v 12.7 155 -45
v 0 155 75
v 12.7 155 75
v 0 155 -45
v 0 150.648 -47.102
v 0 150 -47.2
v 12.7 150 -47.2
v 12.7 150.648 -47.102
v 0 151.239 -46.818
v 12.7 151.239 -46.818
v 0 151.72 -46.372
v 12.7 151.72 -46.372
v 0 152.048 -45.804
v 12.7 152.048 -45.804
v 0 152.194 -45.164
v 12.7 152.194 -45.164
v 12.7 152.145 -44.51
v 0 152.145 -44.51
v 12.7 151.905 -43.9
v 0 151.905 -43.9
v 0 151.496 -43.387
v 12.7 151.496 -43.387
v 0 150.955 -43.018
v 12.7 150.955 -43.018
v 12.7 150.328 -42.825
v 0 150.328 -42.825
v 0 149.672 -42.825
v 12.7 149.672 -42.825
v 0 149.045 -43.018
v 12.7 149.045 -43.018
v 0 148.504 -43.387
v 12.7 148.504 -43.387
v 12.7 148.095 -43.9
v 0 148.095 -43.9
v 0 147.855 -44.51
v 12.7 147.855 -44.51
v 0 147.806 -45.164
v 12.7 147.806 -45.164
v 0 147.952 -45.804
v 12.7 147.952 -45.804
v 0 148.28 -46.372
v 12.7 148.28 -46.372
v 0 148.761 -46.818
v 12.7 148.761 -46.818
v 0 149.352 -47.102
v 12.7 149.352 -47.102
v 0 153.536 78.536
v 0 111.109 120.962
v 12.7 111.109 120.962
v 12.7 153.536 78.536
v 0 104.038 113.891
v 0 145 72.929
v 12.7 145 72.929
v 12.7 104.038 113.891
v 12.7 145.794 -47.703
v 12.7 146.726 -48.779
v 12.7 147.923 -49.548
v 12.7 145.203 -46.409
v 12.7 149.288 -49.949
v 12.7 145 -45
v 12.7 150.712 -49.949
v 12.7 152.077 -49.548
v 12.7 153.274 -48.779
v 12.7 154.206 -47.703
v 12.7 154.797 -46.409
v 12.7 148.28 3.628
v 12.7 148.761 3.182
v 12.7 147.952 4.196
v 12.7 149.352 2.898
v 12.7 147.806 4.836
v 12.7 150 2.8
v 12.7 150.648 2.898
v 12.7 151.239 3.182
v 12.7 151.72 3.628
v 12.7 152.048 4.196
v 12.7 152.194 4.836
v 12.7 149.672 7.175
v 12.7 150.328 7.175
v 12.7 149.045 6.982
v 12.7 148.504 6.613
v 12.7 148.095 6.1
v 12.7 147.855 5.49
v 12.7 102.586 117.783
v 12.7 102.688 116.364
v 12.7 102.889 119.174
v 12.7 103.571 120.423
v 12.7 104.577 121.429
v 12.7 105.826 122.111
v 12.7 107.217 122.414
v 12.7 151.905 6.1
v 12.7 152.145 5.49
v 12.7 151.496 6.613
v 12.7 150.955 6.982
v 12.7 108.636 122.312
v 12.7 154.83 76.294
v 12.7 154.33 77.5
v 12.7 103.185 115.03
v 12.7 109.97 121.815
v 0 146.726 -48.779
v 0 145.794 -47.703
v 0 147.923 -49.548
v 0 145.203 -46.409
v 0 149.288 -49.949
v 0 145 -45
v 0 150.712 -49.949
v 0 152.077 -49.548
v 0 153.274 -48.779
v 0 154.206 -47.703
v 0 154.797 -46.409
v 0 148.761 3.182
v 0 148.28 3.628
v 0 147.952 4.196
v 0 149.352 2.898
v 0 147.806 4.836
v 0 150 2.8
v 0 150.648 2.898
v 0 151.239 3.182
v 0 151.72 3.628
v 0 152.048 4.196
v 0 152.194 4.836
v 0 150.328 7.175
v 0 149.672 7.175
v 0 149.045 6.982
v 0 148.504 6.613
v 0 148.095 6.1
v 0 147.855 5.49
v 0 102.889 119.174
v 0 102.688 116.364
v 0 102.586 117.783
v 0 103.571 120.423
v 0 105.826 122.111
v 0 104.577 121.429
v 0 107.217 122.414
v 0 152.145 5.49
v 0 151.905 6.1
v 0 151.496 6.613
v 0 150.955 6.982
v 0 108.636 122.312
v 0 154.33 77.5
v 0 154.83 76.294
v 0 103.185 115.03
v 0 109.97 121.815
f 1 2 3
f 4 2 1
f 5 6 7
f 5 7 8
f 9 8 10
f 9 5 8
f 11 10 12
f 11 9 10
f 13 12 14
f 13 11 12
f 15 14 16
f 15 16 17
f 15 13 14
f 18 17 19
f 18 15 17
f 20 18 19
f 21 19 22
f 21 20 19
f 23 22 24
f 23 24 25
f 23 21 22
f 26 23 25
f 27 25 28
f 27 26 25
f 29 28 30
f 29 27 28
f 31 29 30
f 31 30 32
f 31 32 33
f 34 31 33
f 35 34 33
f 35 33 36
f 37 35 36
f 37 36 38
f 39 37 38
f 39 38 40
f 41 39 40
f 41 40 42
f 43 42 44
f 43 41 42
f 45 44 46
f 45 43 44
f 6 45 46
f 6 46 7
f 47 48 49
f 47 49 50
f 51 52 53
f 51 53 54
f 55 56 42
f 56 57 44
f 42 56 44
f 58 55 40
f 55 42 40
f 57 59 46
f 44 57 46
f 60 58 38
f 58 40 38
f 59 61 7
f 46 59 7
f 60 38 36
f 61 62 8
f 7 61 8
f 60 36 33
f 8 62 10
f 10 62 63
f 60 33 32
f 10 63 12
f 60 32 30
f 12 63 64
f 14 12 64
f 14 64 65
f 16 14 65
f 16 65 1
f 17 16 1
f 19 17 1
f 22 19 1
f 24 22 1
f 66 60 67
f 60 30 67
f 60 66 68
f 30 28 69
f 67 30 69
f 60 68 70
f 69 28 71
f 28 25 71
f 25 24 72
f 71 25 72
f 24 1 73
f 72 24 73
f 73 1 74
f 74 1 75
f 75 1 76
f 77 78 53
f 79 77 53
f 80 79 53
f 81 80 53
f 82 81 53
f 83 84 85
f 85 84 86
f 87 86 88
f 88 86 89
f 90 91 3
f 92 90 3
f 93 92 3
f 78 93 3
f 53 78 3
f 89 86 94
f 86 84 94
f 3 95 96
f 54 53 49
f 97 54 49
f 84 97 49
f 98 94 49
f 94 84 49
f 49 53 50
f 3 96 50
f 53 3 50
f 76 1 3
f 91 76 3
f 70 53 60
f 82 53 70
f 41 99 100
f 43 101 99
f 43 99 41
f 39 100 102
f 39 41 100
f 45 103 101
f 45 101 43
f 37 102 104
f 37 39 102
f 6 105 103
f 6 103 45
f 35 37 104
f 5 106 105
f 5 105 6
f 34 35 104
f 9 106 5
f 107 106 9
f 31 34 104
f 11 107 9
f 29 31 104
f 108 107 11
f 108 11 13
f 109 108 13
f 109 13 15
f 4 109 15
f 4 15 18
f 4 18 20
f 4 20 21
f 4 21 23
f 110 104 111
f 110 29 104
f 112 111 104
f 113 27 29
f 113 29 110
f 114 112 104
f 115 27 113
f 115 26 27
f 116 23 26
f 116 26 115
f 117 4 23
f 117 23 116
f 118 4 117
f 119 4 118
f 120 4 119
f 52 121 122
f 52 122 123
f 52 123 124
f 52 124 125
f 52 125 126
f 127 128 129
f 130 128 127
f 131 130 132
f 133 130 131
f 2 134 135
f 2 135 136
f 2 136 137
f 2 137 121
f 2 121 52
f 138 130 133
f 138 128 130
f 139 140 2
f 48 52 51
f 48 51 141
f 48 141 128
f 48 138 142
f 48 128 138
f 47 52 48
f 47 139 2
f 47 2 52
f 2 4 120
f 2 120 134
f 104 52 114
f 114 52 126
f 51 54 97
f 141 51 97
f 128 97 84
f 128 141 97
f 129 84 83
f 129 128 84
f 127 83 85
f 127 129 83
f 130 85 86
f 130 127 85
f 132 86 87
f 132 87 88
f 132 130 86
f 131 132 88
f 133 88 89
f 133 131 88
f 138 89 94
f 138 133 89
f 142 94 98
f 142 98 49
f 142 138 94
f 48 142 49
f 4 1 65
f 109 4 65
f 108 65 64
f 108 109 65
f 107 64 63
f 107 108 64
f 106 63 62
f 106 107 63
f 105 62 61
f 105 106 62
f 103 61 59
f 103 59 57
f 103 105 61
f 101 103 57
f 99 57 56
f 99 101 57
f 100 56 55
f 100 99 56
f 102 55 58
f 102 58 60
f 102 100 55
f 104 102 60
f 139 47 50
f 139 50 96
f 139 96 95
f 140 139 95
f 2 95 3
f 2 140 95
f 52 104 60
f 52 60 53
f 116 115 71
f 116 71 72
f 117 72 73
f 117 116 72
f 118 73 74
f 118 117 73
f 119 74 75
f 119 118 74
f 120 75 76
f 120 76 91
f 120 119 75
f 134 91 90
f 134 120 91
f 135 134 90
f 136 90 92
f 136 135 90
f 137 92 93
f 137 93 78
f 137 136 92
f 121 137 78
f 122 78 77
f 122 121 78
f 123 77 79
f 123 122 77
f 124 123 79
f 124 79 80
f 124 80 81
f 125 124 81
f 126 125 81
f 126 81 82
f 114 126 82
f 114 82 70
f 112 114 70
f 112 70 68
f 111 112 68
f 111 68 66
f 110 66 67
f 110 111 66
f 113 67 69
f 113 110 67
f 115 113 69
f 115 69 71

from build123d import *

# Parameters (mm, degrees)
SKETCH2_R           = 2.2
BOSS_EXTRUDE1_DEPTH = 12.7


with BuildPart() as part:
    # Sketch2 → Boss-Extrude1 (new body)
    with BuildSketch(Plane(origin=(0, 0, 0), x_dir=(0, 0, -1), z_dir=(1, 0, 0))):
        with BuildLine():
            Line((-75, 155), (45, 155))
            ThreePointArc((45, 155), (50, 150), (45, 145))
            Line((45, 145), (-72.928932188, 145))
            Line((-72.928932188, 145), (-113.890872965, 104.038059223))
            ThreePointArc((-113.890872965, 104.038059223), (-120.961940777, 104.038059223), (-120.961940777, 111.109127035))
            Line((-120.961940777, 111.109127035), (-78.535533906, 153.535533906))
            ThreePointArc((-78.535533906, 153.535533906), (-76.913417162, 154.619397663), (-75, 155))
        make_face()
        with Locations((-5, 150)):
            Circle(SKETCH2_R, mode=Mode.SUBTRACT)
        with Locations((45, 150)):
            Circle(SKETCH2_R, mode=Mode.SUBTRACT)
    extrude(amount=BOSS_EXTRUDE1_DEPTH)


solid = part.part
